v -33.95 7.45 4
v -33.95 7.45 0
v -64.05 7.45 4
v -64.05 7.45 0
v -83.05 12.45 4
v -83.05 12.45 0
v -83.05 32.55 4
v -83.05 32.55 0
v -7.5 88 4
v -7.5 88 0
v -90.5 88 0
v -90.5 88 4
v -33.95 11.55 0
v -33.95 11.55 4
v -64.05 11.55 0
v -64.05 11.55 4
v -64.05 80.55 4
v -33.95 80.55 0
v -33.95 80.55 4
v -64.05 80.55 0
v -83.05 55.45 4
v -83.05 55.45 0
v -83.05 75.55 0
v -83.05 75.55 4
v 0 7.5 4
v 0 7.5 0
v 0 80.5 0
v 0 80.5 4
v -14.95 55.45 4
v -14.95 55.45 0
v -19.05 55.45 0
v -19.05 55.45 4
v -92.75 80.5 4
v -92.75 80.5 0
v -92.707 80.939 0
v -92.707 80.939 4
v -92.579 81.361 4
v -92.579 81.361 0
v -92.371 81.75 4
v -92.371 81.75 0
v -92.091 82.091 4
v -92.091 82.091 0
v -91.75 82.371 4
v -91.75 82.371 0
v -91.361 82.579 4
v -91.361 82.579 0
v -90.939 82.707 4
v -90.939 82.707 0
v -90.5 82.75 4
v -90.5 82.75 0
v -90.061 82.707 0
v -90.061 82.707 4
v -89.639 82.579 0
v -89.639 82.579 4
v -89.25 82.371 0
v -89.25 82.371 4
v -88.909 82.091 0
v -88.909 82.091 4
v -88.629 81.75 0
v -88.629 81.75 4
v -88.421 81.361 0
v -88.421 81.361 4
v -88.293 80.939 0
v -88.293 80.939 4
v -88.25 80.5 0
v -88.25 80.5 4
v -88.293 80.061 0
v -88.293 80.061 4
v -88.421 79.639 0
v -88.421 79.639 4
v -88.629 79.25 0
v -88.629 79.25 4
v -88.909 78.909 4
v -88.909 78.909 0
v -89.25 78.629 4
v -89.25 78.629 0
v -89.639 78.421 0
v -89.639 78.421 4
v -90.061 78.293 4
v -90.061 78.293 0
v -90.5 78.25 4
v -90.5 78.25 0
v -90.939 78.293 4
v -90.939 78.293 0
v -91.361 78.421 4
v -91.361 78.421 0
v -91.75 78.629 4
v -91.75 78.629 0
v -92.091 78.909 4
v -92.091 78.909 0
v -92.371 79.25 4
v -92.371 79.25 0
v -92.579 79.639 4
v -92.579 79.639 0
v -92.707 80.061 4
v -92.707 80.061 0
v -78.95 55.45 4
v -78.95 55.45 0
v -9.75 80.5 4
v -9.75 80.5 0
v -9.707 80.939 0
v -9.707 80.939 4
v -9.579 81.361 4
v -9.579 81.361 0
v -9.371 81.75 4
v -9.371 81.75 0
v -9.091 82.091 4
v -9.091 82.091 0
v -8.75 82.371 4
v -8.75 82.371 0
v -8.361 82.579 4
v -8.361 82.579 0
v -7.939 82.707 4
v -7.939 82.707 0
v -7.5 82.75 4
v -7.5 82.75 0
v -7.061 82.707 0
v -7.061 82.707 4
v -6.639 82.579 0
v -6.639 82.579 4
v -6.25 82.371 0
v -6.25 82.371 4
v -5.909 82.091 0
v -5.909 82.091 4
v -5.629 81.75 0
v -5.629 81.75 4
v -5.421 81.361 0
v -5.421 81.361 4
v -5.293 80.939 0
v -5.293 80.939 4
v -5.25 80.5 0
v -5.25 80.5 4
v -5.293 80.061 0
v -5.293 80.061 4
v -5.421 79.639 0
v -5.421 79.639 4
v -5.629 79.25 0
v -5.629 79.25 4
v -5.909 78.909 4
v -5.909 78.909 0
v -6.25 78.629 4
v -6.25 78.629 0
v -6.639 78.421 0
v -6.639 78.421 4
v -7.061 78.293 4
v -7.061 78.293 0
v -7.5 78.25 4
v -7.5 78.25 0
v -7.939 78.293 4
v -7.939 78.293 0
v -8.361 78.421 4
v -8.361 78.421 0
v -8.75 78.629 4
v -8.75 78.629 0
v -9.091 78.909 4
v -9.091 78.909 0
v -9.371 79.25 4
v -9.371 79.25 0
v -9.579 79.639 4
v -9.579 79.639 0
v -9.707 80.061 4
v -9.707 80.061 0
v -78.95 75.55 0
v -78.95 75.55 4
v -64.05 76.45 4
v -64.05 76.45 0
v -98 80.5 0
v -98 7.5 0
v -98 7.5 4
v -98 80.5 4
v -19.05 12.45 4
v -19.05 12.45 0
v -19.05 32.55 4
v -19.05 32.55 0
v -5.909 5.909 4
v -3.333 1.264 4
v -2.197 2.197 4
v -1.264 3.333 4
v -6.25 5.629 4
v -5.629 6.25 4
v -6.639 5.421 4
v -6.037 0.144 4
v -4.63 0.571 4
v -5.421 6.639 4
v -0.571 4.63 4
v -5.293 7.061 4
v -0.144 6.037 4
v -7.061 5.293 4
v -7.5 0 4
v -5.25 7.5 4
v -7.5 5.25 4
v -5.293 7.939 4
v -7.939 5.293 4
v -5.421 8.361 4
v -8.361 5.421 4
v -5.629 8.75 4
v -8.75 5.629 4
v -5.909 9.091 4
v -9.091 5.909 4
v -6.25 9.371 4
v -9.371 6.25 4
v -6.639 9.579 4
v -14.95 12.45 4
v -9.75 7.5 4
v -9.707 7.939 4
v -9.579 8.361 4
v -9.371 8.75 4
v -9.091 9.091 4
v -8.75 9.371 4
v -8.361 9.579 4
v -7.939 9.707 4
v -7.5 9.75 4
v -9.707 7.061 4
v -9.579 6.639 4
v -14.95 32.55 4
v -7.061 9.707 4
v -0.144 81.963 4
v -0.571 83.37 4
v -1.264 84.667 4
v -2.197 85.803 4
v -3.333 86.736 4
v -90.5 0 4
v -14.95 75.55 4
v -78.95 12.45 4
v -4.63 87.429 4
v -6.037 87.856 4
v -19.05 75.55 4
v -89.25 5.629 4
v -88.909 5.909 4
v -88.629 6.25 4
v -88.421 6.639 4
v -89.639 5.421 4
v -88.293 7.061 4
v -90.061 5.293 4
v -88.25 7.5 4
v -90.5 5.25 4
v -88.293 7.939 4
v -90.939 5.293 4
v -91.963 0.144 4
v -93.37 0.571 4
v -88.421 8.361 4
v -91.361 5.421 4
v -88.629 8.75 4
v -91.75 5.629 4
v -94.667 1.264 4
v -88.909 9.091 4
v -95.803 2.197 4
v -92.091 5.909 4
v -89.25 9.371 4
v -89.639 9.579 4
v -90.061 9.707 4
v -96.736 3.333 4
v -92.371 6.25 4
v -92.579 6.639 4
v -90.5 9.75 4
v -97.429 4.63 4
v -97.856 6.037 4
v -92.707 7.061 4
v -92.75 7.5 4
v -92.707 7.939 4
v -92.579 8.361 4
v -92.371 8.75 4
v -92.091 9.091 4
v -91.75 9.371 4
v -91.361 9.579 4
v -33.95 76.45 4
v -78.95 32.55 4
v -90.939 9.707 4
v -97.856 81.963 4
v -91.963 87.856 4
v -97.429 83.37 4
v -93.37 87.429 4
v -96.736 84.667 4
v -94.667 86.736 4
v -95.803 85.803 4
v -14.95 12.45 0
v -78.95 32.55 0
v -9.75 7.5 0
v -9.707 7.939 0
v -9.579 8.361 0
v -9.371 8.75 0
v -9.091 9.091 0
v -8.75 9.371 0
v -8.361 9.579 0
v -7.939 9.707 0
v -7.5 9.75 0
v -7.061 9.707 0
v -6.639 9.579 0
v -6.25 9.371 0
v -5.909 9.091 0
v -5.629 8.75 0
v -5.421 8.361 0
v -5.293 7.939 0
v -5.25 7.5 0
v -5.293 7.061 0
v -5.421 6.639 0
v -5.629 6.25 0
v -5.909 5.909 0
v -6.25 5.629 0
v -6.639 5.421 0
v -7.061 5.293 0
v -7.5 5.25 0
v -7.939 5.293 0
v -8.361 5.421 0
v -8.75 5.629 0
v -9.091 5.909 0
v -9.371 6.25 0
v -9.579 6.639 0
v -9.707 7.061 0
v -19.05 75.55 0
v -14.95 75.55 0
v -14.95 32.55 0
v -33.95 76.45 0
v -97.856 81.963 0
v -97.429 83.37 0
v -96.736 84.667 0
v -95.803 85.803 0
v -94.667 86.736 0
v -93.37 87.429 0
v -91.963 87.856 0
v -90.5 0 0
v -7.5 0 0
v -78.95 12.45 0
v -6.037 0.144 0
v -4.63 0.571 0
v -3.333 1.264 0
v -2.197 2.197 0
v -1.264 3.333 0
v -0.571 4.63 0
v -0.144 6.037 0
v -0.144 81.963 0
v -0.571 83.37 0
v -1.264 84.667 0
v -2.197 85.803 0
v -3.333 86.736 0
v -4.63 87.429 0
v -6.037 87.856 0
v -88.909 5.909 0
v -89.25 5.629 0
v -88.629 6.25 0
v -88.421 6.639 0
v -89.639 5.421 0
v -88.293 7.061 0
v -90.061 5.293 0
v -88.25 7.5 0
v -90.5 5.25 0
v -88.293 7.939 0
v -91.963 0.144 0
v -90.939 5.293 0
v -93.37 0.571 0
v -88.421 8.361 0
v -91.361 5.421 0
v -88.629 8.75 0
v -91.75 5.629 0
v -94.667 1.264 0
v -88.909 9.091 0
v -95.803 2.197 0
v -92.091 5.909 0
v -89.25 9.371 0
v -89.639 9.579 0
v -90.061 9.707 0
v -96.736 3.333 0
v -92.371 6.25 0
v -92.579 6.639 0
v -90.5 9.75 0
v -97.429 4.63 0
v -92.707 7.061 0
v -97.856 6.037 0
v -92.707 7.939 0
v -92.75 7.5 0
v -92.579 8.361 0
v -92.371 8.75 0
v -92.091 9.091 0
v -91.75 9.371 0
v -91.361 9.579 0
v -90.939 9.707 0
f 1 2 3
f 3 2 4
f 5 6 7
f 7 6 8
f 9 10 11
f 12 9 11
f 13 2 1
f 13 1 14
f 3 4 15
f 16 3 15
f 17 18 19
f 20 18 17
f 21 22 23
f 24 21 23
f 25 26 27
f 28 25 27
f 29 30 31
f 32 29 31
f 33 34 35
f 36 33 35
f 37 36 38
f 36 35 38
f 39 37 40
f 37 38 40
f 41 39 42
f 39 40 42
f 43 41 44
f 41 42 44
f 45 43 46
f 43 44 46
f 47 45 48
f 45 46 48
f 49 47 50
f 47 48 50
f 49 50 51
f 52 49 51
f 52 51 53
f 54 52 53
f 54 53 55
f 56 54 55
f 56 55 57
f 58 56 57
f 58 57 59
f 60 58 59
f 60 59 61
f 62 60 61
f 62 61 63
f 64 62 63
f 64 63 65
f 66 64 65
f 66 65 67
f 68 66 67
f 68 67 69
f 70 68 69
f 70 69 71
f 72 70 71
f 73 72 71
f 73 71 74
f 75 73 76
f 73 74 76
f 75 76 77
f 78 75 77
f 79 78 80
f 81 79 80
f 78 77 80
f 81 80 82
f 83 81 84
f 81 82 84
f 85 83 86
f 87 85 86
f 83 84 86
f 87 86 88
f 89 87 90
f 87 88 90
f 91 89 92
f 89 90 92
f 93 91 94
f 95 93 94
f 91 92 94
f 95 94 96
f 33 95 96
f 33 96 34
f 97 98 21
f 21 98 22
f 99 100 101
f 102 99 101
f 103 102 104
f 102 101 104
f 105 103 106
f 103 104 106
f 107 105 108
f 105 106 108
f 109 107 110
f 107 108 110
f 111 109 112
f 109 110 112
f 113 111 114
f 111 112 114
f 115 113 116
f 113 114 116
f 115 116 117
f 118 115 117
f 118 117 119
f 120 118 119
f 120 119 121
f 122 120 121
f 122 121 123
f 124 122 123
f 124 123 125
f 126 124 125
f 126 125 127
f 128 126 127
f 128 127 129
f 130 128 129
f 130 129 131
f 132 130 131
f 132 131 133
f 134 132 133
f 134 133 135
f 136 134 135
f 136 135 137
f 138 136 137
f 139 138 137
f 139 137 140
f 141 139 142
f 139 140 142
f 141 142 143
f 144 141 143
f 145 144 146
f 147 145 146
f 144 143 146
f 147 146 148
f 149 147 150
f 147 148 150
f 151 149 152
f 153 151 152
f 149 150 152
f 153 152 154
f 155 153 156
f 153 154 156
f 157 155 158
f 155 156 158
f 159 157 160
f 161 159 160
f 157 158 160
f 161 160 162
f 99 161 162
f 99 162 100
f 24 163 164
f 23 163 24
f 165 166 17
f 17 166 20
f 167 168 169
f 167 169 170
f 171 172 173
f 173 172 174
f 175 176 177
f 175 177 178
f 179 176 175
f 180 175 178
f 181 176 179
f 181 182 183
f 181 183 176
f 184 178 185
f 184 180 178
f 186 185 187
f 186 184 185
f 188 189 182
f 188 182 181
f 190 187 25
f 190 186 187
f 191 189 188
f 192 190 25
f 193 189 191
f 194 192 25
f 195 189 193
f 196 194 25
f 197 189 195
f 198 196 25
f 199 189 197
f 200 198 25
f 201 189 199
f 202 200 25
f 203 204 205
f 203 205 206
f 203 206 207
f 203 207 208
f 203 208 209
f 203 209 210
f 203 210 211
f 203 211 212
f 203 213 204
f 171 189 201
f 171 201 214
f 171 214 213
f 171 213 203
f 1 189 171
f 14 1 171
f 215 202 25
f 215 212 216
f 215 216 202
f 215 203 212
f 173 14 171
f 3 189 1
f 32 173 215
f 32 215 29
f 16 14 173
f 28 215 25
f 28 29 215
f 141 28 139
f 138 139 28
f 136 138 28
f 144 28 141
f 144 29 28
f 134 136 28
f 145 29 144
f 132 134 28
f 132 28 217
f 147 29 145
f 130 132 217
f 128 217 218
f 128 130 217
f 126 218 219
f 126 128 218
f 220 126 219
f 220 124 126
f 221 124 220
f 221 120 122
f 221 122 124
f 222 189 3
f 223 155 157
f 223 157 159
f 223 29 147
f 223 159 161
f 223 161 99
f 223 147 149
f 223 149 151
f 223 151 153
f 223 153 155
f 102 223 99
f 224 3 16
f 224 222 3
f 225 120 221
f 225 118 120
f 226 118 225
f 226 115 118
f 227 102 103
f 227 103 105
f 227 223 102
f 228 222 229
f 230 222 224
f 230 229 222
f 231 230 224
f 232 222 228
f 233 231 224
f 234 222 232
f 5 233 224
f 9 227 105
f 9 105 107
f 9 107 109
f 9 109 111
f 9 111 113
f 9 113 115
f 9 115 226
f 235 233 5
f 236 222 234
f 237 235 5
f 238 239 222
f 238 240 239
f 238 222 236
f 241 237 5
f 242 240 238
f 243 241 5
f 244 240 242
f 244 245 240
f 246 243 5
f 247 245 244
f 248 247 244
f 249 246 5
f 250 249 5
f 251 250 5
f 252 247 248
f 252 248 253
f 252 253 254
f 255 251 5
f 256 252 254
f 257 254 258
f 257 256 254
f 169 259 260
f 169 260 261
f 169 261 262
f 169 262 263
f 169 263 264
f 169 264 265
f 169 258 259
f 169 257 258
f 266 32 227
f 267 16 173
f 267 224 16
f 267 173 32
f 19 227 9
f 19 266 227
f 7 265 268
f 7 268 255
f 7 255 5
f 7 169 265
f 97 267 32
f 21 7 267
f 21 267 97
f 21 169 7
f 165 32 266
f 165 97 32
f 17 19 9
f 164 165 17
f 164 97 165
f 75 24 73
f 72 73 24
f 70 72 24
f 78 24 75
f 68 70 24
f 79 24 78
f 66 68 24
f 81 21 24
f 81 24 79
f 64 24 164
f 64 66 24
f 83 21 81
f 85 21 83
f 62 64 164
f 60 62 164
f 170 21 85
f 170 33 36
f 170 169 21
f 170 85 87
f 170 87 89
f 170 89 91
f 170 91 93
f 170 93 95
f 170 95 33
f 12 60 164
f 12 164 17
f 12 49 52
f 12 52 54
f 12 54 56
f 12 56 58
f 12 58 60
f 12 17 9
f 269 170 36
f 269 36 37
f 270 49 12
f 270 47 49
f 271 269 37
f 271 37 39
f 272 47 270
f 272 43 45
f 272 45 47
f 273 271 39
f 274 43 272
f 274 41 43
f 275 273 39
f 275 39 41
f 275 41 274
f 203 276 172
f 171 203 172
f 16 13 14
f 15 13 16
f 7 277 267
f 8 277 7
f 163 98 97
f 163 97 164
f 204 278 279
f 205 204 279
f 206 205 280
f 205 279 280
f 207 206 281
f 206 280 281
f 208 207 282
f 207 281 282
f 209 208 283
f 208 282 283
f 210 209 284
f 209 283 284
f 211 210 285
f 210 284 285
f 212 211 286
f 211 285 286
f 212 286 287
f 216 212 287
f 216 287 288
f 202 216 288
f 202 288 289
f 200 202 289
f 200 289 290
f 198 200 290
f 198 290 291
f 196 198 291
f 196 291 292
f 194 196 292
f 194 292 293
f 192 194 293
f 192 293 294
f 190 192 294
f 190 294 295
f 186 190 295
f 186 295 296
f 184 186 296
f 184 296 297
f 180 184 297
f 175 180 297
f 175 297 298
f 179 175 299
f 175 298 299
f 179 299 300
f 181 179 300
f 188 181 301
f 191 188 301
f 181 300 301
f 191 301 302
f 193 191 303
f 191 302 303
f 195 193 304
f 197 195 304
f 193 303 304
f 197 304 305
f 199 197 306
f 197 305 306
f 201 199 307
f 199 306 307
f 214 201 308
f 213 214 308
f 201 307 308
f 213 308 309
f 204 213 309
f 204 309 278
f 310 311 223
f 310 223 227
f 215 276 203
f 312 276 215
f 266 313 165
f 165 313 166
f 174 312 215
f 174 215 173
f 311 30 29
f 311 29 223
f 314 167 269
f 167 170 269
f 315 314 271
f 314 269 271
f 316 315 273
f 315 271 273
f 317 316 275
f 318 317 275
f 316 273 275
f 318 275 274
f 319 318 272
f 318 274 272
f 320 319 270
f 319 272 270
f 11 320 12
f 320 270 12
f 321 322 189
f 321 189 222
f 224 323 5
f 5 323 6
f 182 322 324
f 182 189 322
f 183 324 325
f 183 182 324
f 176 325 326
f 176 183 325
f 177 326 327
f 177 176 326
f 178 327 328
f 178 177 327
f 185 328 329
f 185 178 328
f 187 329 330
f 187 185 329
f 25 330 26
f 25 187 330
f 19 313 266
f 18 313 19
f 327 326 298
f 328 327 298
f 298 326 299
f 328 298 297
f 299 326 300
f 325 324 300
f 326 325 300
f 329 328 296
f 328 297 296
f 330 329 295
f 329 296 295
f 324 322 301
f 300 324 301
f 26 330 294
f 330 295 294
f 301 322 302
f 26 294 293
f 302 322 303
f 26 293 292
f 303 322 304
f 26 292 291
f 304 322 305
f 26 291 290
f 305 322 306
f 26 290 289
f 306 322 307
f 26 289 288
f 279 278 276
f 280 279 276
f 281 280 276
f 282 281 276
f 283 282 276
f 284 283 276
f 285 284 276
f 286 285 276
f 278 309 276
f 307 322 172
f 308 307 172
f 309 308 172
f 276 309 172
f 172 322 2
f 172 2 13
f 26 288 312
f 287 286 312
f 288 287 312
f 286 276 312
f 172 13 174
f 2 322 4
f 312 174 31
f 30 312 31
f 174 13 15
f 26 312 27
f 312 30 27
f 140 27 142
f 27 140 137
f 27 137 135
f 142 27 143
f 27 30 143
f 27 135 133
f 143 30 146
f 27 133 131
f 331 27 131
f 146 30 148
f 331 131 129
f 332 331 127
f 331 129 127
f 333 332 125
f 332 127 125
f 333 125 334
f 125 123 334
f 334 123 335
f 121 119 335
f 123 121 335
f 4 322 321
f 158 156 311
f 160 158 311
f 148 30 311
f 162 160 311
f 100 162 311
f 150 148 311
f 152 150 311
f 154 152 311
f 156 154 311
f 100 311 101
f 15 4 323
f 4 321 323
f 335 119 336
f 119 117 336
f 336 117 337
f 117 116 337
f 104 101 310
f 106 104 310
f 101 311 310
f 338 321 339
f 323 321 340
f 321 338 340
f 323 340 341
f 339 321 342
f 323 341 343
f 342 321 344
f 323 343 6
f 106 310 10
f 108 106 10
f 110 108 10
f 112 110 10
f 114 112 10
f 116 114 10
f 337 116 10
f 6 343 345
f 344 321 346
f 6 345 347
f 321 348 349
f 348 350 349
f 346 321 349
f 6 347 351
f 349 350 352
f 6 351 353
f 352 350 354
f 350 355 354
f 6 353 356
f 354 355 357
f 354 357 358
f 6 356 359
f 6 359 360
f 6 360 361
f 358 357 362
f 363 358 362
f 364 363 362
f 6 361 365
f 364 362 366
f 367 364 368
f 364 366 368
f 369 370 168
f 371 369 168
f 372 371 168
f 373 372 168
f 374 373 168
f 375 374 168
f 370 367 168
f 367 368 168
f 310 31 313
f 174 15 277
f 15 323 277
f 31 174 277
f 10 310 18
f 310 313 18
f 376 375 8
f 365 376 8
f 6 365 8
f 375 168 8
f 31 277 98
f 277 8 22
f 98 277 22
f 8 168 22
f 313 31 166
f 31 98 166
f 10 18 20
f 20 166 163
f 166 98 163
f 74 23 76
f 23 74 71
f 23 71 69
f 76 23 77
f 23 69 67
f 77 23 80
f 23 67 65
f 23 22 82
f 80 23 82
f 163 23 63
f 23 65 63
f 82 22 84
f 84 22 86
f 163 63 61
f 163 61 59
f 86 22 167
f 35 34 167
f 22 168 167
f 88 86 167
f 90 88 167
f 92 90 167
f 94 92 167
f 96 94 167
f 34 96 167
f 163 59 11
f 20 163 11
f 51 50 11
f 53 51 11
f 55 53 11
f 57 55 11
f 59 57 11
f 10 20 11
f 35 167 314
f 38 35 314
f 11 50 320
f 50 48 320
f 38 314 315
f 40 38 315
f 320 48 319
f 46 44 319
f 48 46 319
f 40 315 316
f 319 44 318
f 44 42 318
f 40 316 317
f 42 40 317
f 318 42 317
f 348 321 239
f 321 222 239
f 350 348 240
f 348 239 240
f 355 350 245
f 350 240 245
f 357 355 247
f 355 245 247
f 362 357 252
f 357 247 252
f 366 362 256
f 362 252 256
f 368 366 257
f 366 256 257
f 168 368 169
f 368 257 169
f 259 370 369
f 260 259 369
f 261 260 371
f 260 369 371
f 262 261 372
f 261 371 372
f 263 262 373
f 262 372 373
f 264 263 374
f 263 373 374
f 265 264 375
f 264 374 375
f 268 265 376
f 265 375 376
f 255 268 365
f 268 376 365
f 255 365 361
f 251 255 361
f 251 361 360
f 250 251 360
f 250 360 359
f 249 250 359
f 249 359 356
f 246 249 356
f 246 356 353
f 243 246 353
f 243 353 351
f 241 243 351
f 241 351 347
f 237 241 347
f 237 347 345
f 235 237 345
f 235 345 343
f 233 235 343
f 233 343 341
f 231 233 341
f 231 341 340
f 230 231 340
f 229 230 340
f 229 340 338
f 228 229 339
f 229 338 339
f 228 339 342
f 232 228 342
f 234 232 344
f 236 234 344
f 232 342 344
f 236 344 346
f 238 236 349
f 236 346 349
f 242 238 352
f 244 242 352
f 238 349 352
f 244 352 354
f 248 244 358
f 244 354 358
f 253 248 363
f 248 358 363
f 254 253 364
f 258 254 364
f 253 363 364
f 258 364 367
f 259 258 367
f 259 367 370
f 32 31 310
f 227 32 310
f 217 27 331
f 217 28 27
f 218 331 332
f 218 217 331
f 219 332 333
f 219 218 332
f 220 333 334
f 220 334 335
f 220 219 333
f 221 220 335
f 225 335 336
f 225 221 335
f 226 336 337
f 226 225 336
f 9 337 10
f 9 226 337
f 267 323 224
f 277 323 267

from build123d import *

# Parameters (mm, degrees)
SKETCH_1_W         = 88
SKETCH_1_H         = 98
SKETCH_1_W_2       = 4.1
SKETCH_1_H_2       = 30.1
SKETCH_1_W_3       = 20.1
SKETCH_1_H_3       = 4.1
EXTRUDE_1_DEPTH    = 4
HOLE_WIZARD_M4_1_D = 4.5
FILLET_3_R         = 7.5


with BuildPart() as part:
    # ｽｹｯﾁ1 → ﾎﾞｽ - 押し出し1 (new body)
    with BuildSketch(Plane(origin=(0, 0, 0), x_dir=(0, 1, 0), z_dir=(0, 0, 1))):
        with Locations((44, 49)):
            Rectangle(SKETCH_1_W, SKETCH_1_H)
        with Locations((78.5, 49)):
            Rectangle(SKETCH_1_W_2, SKETCH_1_H_2, mode=Mode.SUBTRACT)
        with Locations((22.5, 81)):
            Rectangle(SKETCH_1_W_3, SKETCH_1_H_3, mode=Mode.SUBTRACT)
        with Locations((65.5, 81)):
            Rectangle(SKETCH_1_W_3, SKETCH_1_H_3, mode=Mode.SUBTRACT)
        with Locations((22.5, 17)):
            Rectangle(SKETCH_1_W_3, SKETCH_1_H_3, mode=Mode.SUBTRACT)
        with Locations((65.5, 17)):
            Rectangle(SKETCH_1_W_3, SKETCH_1_H_3, mode=Mode.SUBTRACT)
        with Locations((9.5, 49)):
            Rectangle(SKETCH_1_W_2, SKETCH_1_H_2, mode=Mode.SUBTRACT)
    extrude(amount=EXTRUDE_1_DEPTH)

    # M4 すきま穴1 (through all)
    with Locations(Plane.XY.offset(4)):
        with Locations((-90.5, 80.5), (-7.5, 80.5), (-7.5, 7.5), (-90.5, 7.5)):
            Hole(HOLE_WIZARD_M4_1_D / 2)

    # ﾌｨﾚｯﾄ3
    fillet_3_edges = [part.edges().sort_by_distance(p)[0] for p in [
        (-98, 0, 2),
        (-98, 88, 2),
        (0, 88, 2),
        (0, 0, 2),
    ]]
    fillet(fillet_3_edges, radius=FILLET_3_R)


solid = part.part
